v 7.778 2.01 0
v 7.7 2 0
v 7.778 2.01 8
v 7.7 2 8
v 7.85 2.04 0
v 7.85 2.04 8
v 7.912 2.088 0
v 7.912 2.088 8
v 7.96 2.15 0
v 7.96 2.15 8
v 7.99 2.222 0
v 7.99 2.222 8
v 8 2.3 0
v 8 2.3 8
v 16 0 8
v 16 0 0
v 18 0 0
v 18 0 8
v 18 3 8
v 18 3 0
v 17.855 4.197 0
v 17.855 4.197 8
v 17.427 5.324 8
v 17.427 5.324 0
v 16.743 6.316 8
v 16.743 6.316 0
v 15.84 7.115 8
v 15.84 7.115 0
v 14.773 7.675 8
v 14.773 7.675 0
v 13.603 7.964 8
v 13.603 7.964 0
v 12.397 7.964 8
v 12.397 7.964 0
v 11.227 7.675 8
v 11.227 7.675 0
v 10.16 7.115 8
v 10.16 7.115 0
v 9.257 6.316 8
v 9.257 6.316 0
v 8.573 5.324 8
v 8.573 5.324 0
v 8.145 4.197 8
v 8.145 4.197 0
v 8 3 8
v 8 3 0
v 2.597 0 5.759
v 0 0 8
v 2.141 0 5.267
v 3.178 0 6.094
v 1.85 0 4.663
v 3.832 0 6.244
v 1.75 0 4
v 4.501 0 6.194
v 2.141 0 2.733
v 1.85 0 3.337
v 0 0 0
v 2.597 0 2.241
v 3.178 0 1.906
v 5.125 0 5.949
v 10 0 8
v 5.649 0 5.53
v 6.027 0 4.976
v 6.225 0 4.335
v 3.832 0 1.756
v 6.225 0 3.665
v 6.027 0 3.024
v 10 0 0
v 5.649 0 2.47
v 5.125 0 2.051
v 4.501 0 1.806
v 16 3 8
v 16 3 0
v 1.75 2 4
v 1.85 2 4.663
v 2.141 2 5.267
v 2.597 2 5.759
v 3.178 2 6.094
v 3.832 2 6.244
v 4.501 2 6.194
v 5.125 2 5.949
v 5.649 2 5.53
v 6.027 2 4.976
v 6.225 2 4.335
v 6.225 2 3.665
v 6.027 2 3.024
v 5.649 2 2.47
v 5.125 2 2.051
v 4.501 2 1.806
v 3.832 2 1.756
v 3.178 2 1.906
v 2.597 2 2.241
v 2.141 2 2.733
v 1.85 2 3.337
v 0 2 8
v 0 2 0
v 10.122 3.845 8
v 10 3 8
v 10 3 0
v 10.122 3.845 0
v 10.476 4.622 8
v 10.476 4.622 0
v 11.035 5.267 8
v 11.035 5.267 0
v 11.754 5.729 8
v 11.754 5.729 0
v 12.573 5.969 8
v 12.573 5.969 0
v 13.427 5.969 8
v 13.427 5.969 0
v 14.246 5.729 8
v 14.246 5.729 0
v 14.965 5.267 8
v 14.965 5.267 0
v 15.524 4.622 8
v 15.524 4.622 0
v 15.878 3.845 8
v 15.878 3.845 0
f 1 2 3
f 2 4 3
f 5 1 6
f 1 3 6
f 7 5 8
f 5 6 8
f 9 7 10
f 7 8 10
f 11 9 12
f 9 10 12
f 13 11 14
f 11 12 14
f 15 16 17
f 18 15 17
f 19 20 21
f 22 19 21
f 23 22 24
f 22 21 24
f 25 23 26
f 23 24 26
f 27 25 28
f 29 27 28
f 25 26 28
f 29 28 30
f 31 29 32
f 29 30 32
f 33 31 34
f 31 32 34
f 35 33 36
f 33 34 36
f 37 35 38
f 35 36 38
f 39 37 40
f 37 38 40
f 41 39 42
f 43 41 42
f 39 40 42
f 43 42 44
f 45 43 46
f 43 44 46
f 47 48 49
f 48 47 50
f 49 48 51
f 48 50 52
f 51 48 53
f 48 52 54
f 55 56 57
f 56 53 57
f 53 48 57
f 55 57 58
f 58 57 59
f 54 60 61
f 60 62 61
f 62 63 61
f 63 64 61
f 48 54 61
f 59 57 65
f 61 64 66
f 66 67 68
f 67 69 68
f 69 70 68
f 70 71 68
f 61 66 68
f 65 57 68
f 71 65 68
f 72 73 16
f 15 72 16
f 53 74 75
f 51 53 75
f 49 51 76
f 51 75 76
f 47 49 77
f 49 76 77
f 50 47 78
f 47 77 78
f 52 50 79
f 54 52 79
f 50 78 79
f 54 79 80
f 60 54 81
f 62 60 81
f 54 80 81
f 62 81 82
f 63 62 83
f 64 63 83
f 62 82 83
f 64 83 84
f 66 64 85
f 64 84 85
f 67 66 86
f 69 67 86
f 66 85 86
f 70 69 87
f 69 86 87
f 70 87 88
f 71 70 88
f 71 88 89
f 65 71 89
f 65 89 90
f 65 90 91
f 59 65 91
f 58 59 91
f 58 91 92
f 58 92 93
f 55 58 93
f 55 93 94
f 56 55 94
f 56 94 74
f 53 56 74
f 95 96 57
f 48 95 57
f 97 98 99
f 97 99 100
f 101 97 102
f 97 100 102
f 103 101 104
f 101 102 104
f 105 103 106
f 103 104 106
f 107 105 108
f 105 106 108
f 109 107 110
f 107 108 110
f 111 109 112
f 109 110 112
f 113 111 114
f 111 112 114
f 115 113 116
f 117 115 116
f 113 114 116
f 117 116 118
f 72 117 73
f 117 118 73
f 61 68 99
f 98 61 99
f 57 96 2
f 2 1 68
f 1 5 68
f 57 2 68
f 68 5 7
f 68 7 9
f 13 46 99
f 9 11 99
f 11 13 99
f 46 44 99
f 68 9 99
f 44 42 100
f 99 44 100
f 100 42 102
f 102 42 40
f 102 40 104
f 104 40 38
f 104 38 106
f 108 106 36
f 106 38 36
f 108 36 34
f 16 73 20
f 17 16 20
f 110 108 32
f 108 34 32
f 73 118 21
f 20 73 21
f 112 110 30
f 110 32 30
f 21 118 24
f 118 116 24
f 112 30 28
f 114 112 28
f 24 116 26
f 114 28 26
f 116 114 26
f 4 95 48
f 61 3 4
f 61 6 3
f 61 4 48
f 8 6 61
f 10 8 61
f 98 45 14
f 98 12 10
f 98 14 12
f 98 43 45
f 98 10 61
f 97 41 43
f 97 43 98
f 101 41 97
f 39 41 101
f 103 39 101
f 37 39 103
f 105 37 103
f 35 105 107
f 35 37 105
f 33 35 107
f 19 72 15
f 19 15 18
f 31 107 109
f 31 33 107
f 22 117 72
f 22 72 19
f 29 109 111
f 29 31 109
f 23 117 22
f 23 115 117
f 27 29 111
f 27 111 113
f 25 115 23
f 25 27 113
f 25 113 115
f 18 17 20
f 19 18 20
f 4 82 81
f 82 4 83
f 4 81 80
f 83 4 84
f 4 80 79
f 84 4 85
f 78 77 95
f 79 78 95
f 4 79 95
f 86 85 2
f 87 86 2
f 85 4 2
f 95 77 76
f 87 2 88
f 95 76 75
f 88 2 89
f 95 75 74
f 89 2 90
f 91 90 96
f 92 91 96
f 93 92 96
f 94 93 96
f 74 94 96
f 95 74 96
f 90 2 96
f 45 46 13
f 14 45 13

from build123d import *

# Parameters (mm, degrees)
BASE_EXTRUSION_DEPTH    = 8
ESQUISSE2_R             = 2.25
ENL_V_MAT_EXTRU_1_DEPTH = 3
CONG_1_R                = 0.3


with BuildPart() as part:
    # Esquisse1 → Base-Extrusion (new body)
    with BuildSketch(Plane.XY):
        with BuildLine():
            Line((0, 0), (10, 0))
            Line((10, 0), (10, 3))
            ThreePointArc((10, 3), (13, 6), (16, 3))
            Line((16, 3), (16, 0))
            Line((16, 0), (18, 0))
            Line((18, 0), (18, 3))
            ThreePointArc((18, 3), (13, 8), (8, 3))
            Line((8, 3), (8, 2))
            Line((8, 2), (0, 2))
            Line((0, 2), (0, 0))
        make_face()
    extrude(amount=BASE_EXTRUSION_DEPTH)

    # Esquisse2 → Enlèv. mat.-Extru.1 (cut, through all)
    with BuildSketch(Plane(origin=(0, 2, 0), x_dir=(-1, 0, 0), z_dir=(0, 1, 0))):
        with Locations((-4, 4)):
            Circle(ESQUISSE2_R)
    extrude(amount=-ENL_V_MAT_EXTRU_1_DEPTH, mode=Mode.SUBTRACT)

    # Congé1
    cong_1_edges = [part.edges().sort_by_distance(p)[0] for p in [
        (8, 2, 4),
    ]]
    fillet(cong_1_edges, radius=CONG_1_R)


solid = part.part
